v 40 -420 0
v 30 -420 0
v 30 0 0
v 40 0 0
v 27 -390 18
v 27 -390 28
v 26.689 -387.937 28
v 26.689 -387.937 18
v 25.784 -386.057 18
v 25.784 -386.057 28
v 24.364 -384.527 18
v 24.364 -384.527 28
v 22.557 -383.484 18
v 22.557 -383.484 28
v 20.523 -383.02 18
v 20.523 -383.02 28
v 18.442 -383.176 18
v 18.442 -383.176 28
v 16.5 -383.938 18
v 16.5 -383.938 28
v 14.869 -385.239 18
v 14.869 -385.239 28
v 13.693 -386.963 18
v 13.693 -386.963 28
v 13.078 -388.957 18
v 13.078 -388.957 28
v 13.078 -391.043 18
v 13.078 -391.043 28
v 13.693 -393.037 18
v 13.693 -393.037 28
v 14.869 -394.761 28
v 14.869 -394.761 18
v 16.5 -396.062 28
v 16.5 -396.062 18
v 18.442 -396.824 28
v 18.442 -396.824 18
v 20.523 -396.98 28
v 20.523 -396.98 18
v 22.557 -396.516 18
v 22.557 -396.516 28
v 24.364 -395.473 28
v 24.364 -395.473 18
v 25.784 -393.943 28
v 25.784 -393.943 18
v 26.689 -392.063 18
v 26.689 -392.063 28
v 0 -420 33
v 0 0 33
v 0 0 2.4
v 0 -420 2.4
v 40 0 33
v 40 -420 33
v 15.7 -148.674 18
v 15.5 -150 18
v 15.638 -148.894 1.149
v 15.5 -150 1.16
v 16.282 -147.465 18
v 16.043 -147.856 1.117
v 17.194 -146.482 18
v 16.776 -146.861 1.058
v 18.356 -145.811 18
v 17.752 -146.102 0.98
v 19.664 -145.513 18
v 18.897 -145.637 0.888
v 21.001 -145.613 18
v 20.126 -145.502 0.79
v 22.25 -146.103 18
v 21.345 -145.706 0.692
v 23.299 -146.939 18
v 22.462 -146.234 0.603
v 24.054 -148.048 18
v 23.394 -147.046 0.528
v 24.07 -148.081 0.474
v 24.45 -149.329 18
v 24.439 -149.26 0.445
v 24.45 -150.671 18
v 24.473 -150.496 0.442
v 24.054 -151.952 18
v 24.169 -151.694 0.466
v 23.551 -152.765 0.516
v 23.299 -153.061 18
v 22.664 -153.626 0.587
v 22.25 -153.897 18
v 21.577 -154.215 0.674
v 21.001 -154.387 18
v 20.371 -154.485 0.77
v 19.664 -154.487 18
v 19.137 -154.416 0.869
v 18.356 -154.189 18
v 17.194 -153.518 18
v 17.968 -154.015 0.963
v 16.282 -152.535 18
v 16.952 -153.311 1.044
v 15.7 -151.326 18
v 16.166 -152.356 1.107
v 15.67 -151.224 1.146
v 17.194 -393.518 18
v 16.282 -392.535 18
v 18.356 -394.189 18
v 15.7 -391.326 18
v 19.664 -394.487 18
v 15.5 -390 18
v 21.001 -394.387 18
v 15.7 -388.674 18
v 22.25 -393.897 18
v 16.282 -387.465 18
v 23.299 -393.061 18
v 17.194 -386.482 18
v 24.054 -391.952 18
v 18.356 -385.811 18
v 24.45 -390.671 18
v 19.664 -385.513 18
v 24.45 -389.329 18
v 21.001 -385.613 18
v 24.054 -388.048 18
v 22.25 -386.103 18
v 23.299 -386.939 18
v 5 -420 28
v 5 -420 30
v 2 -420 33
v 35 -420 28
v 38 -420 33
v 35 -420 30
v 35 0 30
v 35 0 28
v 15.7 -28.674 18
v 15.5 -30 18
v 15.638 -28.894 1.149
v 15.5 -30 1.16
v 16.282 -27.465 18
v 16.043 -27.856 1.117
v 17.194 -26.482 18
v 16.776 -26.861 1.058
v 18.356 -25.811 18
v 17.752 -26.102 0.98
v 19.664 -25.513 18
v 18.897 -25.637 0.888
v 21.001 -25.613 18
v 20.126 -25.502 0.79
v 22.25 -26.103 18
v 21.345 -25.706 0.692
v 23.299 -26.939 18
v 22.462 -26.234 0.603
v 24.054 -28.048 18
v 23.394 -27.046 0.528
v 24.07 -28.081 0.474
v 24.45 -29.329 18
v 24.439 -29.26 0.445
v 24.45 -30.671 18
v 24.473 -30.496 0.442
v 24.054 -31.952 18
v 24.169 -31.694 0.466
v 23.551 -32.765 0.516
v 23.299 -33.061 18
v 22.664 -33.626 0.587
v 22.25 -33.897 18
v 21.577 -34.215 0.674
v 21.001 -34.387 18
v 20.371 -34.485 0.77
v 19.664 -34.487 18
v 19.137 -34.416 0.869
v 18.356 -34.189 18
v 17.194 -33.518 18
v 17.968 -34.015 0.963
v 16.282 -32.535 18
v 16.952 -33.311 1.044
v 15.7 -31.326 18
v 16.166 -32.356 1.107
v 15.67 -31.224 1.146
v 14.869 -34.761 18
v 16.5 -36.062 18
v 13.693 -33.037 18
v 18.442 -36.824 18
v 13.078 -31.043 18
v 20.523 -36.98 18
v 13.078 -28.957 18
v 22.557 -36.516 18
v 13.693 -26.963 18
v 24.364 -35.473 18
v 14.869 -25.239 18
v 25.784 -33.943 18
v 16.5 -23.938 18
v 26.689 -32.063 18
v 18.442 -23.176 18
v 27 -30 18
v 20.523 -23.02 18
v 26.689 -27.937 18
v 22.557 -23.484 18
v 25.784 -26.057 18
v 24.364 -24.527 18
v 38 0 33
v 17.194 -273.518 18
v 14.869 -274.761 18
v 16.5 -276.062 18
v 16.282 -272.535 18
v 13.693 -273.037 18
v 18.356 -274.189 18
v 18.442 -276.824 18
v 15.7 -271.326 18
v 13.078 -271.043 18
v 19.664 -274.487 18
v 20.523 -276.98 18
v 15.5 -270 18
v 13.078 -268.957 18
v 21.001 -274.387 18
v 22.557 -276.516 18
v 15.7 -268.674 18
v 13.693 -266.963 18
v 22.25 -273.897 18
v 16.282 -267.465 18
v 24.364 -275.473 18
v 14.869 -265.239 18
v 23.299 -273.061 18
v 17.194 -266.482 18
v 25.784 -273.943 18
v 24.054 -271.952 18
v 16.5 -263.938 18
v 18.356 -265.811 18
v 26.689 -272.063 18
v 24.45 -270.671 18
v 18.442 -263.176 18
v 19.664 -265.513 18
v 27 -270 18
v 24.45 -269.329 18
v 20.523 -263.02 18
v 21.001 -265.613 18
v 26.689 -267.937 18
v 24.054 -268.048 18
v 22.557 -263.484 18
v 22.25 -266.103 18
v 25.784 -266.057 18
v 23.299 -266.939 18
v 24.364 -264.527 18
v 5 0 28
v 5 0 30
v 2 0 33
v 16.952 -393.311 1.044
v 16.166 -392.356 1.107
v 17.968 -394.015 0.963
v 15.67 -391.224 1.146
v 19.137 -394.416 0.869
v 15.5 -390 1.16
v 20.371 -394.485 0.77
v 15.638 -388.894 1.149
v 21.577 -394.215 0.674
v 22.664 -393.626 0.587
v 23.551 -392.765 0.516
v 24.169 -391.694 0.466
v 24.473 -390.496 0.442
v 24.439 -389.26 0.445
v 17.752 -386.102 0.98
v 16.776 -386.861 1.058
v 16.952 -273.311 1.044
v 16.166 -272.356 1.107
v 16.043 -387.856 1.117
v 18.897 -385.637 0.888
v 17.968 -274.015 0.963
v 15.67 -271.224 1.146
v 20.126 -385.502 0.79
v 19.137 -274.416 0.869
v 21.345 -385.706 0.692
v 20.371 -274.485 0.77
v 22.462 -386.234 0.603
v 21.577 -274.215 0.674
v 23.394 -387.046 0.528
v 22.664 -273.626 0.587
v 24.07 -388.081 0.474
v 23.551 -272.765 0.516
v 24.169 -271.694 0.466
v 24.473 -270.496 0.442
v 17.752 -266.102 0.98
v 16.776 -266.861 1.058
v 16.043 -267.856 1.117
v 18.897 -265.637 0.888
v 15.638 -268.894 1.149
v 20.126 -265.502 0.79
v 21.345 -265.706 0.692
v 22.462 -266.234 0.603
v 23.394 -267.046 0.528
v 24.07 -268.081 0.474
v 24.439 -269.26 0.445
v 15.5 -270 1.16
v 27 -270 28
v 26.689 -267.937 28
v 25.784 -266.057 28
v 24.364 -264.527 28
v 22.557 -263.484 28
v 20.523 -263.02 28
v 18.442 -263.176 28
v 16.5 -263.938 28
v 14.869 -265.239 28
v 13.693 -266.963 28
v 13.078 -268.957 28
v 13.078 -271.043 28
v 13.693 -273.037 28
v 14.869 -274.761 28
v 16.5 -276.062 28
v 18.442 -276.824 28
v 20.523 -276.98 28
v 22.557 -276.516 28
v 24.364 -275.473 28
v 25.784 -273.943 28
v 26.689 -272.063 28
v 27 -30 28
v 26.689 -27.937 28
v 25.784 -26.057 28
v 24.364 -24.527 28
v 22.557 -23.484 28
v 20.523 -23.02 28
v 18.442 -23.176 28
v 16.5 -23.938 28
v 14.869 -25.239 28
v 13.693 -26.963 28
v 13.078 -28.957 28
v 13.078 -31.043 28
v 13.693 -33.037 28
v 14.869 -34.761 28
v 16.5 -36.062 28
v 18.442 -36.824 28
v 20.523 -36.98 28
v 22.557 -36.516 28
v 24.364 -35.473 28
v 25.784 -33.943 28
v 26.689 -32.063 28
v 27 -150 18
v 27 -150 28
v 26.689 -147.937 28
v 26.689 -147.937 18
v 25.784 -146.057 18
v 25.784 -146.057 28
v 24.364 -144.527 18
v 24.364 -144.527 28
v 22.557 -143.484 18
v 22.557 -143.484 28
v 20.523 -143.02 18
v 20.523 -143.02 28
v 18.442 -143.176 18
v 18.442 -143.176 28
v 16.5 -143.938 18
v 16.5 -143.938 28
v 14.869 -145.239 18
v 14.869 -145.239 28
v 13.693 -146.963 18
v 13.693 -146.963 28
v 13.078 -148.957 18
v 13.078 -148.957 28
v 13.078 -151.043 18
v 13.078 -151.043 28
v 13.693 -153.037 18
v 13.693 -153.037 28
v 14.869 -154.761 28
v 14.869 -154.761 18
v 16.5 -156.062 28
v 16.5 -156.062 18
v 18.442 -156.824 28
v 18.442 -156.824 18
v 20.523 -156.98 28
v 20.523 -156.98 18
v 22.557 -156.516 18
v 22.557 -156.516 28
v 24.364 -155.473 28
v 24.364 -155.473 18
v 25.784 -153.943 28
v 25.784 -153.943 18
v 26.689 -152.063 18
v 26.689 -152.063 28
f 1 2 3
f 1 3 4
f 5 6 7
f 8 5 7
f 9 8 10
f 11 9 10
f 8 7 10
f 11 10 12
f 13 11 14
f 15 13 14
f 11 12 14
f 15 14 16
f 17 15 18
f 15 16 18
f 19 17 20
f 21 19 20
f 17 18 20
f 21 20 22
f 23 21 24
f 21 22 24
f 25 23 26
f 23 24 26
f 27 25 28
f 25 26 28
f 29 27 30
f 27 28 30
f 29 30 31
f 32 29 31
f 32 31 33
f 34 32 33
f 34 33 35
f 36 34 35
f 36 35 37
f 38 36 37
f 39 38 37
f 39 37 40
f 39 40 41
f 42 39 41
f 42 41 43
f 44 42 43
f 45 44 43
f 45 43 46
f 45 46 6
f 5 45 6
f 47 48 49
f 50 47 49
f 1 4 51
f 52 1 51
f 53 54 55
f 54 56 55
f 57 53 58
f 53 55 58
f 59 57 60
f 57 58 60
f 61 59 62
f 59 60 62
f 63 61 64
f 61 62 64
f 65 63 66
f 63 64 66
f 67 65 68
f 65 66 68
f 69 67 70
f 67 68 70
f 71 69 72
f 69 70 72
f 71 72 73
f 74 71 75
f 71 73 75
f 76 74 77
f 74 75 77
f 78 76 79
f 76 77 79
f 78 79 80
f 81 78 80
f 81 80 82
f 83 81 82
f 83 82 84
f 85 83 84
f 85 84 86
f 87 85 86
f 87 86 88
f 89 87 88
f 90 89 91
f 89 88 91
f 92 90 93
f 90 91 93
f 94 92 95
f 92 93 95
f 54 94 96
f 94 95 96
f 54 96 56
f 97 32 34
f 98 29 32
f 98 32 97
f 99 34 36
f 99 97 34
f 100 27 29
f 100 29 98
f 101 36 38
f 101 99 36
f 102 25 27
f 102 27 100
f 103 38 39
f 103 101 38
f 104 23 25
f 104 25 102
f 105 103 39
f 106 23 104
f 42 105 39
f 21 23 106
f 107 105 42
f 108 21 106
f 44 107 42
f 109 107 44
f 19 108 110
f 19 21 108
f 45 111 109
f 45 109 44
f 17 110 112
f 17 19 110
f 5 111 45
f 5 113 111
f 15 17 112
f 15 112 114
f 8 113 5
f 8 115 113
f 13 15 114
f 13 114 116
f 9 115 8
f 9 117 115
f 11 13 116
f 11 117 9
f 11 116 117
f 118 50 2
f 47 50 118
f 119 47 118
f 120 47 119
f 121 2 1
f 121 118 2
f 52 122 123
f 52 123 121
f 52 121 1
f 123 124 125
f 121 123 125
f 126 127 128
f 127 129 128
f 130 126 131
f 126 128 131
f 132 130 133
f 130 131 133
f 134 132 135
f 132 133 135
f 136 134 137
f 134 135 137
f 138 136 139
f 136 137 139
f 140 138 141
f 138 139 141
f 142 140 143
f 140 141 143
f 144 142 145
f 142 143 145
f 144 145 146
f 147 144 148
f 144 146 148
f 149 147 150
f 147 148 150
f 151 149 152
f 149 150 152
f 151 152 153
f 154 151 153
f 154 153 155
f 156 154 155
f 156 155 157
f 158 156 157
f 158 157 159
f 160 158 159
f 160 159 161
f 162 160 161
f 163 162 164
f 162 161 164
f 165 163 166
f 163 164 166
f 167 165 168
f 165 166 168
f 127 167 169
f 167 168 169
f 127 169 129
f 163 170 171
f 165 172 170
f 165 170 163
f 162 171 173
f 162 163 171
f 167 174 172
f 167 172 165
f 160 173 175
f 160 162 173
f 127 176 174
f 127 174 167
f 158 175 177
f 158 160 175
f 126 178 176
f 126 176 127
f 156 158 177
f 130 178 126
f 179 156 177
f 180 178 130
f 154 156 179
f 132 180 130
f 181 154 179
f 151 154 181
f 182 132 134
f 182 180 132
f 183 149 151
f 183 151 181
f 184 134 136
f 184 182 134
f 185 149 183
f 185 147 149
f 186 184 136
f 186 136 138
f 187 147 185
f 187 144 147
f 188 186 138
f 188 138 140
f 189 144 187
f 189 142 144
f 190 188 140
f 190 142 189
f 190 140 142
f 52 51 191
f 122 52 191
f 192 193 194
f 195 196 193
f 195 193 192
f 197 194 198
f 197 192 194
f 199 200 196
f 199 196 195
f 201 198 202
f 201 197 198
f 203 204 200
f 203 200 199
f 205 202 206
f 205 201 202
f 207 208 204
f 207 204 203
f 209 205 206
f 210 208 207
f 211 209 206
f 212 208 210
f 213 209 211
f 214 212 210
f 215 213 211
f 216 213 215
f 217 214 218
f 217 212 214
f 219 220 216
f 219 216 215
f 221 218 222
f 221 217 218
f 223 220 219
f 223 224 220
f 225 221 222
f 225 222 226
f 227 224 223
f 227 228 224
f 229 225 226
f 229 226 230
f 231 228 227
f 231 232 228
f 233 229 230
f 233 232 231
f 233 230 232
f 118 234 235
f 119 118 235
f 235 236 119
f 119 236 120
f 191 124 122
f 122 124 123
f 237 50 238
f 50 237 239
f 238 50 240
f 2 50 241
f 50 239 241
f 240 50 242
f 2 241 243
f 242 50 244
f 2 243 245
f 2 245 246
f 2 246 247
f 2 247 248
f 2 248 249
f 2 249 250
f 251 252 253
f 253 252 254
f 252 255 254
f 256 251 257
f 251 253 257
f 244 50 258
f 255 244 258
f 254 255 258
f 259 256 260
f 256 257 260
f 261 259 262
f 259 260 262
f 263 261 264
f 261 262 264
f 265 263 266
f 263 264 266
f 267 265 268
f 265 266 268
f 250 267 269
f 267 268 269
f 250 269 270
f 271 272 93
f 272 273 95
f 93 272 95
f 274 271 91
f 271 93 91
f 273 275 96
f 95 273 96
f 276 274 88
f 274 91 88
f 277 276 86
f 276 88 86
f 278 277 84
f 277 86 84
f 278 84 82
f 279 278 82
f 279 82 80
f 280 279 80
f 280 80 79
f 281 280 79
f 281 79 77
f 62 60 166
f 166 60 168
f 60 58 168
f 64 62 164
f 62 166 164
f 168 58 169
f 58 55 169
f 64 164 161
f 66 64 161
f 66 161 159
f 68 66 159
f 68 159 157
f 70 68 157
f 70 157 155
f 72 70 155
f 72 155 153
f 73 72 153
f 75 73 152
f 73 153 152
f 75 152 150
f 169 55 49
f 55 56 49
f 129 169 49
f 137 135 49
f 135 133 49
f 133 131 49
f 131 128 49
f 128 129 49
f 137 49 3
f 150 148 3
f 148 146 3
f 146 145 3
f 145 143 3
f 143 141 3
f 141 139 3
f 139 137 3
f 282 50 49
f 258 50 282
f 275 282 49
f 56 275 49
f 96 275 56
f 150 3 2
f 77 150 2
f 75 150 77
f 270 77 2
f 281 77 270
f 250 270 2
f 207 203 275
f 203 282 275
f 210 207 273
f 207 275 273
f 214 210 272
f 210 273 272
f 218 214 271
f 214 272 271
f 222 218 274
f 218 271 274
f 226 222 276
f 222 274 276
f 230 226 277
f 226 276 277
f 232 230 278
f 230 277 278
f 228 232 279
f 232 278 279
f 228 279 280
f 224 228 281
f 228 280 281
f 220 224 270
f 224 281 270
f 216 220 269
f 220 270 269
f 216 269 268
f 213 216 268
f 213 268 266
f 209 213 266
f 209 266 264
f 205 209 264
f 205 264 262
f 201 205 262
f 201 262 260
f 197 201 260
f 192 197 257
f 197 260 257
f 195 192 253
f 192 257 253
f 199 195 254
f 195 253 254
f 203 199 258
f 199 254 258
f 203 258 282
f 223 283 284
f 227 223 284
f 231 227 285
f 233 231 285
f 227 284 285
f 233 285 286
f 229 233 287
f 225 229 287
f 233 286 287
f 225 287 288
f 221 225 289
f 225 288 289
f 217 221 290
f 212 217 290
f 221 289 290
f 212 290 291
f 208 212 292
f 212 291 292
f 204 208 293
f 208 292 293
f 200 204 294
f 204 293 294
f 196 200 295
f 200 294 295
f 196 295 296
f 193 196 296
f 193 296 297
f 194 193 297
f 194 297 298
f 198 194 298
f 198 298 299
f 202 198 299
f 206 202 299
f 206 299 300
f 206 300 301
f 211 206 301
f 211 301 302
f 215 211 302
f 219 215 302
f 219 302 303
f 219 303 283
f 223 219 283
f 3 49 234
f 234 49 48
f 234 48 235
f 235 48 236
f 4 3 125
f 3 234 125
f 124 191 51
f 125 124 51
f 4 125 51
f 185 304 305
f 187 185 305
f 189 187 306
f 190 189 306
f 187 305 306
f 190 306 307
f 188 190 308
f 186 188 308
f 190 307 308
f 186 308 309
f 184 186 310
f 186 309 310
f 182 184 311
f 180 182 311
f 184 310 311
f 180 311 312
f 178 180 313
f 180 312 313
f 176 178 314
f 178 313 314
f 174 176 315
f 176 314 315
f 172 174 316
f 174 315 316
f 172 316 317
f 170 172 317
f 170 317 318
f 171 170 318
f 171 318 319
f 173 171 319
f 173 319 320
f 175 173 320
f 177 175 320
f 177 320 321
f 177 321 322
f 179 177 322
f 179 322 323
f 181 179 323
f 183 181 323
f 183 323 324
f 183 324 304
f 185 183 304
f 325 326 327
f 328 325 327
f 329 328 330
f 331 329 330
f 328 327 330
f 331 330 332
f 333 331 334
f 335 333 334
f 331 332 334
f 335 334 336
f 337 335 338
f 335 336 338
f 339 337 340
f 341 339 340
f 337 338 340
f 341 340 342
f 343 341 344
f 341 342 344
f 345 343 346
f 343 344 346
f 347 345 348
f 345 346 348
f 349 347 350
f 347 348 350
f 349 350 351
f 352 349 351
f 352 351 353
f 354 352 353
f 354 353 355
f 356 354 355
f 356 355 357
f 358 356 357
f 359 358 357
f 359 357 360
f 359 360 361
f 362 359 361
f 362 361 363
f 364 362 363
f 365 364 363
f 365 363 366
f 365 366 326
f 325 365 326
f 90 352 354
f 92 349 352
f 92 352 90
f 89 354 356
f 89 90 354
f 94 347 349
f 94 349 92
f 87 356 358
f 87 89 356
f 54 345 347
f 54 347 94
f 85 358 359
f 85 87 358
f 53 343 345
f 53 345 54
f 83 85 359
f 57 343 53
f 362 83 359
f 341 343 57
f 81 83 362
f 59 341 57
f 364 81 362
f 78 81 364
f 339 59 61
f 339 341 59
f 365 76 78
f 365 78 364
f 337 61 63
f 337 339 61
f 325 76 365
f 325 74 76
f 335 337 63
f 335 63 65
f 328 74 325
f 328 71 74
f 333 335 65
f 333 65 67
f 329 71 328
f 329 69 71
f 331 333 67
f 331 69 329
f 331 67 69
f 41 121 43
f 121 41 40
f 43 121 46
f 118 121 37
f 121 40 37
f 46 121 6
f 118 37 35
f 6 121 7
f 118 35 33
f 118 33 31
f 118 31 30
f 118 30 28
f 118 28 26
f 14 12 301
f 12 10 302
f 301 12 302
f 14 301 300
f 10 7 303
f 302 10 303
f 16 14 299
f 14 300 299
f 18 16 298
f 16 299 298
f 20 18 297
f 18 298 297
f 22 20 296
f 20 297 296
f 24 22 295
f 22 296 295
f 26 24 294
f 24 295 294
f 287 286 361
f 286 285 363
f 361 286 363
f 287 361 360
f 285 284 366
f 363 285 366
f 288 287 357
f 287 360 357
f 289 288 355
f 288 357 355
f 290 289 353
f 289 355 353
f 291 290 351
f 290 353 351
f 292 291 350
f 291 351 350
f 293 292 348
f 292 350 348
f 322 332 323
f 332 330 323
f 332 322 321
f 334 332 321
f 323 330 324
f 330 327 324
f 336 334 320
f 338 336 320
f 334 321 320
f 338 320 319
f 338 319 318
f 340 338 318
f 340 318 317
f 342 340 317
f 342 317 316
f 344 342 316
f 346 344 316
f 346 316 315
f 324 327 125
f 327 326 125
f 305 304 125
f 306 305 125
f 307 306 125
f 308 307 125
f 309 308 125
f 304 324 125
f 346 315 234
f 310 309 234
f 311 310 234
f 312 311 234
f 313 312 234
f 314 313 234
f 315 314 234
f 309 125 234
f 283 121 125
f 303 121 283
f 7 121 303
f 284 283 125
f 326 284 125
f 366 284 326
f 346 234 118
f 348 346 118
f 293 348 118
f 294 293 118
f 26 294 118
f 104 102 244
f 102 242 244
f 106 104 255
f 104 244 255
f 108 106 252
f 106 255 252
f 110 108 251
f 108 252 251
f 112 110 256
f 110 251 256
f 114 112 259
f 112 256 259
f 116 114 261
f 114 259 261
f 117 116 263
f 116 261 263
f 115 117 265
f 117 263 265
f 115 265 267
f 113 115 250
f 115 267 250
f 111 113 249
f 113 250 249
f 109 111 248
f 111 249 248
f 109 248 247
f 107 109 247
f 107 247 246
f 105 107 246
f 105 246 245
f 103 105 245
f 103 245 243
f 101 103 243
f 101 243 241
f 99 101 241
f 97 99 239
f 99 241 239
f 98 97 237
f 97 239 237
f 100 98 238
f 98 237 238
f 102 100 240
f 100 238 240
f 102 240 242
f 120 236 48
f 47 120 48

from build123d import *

# Parameters (mm, degrees)
F1_DEPTH       = 420
F2_SIZE        = 3
F4_D           = 9
F4_CBORE_D     = 14
F4_CBORE_DEPTH = 10


with BuildPart() as f1:
    # F0 (on Front) → F1 (new body)
    with BuildSketch(Plane.XZ):
        Polygon((0, 2.400041), (30, 0), (40, 0), (40, 33), (35, 33), (35, 28), (5, 28), (5, 33), (0, 33), align=None)
    extrude(amount=F1_DEPTH)

    # F2
    f2_edges = [f1.edges().sort_by_distance(p)[0] for p in [
        (5, -210, 33),
        (35, -210, 33),
    ]]
    chamfer(f2_edges, length=F2_SIZE)

    # F4 (through all)
    with Locations(Plane.XY.offset(28)):
        with Locations((20, -390), (20, -270), (20, -150), (20, -30)):
            CounterBoreHole(F4_D / 2, F4_CBORE_D / 2, F4_CBORE_DEPTH)


solid = f1.part
